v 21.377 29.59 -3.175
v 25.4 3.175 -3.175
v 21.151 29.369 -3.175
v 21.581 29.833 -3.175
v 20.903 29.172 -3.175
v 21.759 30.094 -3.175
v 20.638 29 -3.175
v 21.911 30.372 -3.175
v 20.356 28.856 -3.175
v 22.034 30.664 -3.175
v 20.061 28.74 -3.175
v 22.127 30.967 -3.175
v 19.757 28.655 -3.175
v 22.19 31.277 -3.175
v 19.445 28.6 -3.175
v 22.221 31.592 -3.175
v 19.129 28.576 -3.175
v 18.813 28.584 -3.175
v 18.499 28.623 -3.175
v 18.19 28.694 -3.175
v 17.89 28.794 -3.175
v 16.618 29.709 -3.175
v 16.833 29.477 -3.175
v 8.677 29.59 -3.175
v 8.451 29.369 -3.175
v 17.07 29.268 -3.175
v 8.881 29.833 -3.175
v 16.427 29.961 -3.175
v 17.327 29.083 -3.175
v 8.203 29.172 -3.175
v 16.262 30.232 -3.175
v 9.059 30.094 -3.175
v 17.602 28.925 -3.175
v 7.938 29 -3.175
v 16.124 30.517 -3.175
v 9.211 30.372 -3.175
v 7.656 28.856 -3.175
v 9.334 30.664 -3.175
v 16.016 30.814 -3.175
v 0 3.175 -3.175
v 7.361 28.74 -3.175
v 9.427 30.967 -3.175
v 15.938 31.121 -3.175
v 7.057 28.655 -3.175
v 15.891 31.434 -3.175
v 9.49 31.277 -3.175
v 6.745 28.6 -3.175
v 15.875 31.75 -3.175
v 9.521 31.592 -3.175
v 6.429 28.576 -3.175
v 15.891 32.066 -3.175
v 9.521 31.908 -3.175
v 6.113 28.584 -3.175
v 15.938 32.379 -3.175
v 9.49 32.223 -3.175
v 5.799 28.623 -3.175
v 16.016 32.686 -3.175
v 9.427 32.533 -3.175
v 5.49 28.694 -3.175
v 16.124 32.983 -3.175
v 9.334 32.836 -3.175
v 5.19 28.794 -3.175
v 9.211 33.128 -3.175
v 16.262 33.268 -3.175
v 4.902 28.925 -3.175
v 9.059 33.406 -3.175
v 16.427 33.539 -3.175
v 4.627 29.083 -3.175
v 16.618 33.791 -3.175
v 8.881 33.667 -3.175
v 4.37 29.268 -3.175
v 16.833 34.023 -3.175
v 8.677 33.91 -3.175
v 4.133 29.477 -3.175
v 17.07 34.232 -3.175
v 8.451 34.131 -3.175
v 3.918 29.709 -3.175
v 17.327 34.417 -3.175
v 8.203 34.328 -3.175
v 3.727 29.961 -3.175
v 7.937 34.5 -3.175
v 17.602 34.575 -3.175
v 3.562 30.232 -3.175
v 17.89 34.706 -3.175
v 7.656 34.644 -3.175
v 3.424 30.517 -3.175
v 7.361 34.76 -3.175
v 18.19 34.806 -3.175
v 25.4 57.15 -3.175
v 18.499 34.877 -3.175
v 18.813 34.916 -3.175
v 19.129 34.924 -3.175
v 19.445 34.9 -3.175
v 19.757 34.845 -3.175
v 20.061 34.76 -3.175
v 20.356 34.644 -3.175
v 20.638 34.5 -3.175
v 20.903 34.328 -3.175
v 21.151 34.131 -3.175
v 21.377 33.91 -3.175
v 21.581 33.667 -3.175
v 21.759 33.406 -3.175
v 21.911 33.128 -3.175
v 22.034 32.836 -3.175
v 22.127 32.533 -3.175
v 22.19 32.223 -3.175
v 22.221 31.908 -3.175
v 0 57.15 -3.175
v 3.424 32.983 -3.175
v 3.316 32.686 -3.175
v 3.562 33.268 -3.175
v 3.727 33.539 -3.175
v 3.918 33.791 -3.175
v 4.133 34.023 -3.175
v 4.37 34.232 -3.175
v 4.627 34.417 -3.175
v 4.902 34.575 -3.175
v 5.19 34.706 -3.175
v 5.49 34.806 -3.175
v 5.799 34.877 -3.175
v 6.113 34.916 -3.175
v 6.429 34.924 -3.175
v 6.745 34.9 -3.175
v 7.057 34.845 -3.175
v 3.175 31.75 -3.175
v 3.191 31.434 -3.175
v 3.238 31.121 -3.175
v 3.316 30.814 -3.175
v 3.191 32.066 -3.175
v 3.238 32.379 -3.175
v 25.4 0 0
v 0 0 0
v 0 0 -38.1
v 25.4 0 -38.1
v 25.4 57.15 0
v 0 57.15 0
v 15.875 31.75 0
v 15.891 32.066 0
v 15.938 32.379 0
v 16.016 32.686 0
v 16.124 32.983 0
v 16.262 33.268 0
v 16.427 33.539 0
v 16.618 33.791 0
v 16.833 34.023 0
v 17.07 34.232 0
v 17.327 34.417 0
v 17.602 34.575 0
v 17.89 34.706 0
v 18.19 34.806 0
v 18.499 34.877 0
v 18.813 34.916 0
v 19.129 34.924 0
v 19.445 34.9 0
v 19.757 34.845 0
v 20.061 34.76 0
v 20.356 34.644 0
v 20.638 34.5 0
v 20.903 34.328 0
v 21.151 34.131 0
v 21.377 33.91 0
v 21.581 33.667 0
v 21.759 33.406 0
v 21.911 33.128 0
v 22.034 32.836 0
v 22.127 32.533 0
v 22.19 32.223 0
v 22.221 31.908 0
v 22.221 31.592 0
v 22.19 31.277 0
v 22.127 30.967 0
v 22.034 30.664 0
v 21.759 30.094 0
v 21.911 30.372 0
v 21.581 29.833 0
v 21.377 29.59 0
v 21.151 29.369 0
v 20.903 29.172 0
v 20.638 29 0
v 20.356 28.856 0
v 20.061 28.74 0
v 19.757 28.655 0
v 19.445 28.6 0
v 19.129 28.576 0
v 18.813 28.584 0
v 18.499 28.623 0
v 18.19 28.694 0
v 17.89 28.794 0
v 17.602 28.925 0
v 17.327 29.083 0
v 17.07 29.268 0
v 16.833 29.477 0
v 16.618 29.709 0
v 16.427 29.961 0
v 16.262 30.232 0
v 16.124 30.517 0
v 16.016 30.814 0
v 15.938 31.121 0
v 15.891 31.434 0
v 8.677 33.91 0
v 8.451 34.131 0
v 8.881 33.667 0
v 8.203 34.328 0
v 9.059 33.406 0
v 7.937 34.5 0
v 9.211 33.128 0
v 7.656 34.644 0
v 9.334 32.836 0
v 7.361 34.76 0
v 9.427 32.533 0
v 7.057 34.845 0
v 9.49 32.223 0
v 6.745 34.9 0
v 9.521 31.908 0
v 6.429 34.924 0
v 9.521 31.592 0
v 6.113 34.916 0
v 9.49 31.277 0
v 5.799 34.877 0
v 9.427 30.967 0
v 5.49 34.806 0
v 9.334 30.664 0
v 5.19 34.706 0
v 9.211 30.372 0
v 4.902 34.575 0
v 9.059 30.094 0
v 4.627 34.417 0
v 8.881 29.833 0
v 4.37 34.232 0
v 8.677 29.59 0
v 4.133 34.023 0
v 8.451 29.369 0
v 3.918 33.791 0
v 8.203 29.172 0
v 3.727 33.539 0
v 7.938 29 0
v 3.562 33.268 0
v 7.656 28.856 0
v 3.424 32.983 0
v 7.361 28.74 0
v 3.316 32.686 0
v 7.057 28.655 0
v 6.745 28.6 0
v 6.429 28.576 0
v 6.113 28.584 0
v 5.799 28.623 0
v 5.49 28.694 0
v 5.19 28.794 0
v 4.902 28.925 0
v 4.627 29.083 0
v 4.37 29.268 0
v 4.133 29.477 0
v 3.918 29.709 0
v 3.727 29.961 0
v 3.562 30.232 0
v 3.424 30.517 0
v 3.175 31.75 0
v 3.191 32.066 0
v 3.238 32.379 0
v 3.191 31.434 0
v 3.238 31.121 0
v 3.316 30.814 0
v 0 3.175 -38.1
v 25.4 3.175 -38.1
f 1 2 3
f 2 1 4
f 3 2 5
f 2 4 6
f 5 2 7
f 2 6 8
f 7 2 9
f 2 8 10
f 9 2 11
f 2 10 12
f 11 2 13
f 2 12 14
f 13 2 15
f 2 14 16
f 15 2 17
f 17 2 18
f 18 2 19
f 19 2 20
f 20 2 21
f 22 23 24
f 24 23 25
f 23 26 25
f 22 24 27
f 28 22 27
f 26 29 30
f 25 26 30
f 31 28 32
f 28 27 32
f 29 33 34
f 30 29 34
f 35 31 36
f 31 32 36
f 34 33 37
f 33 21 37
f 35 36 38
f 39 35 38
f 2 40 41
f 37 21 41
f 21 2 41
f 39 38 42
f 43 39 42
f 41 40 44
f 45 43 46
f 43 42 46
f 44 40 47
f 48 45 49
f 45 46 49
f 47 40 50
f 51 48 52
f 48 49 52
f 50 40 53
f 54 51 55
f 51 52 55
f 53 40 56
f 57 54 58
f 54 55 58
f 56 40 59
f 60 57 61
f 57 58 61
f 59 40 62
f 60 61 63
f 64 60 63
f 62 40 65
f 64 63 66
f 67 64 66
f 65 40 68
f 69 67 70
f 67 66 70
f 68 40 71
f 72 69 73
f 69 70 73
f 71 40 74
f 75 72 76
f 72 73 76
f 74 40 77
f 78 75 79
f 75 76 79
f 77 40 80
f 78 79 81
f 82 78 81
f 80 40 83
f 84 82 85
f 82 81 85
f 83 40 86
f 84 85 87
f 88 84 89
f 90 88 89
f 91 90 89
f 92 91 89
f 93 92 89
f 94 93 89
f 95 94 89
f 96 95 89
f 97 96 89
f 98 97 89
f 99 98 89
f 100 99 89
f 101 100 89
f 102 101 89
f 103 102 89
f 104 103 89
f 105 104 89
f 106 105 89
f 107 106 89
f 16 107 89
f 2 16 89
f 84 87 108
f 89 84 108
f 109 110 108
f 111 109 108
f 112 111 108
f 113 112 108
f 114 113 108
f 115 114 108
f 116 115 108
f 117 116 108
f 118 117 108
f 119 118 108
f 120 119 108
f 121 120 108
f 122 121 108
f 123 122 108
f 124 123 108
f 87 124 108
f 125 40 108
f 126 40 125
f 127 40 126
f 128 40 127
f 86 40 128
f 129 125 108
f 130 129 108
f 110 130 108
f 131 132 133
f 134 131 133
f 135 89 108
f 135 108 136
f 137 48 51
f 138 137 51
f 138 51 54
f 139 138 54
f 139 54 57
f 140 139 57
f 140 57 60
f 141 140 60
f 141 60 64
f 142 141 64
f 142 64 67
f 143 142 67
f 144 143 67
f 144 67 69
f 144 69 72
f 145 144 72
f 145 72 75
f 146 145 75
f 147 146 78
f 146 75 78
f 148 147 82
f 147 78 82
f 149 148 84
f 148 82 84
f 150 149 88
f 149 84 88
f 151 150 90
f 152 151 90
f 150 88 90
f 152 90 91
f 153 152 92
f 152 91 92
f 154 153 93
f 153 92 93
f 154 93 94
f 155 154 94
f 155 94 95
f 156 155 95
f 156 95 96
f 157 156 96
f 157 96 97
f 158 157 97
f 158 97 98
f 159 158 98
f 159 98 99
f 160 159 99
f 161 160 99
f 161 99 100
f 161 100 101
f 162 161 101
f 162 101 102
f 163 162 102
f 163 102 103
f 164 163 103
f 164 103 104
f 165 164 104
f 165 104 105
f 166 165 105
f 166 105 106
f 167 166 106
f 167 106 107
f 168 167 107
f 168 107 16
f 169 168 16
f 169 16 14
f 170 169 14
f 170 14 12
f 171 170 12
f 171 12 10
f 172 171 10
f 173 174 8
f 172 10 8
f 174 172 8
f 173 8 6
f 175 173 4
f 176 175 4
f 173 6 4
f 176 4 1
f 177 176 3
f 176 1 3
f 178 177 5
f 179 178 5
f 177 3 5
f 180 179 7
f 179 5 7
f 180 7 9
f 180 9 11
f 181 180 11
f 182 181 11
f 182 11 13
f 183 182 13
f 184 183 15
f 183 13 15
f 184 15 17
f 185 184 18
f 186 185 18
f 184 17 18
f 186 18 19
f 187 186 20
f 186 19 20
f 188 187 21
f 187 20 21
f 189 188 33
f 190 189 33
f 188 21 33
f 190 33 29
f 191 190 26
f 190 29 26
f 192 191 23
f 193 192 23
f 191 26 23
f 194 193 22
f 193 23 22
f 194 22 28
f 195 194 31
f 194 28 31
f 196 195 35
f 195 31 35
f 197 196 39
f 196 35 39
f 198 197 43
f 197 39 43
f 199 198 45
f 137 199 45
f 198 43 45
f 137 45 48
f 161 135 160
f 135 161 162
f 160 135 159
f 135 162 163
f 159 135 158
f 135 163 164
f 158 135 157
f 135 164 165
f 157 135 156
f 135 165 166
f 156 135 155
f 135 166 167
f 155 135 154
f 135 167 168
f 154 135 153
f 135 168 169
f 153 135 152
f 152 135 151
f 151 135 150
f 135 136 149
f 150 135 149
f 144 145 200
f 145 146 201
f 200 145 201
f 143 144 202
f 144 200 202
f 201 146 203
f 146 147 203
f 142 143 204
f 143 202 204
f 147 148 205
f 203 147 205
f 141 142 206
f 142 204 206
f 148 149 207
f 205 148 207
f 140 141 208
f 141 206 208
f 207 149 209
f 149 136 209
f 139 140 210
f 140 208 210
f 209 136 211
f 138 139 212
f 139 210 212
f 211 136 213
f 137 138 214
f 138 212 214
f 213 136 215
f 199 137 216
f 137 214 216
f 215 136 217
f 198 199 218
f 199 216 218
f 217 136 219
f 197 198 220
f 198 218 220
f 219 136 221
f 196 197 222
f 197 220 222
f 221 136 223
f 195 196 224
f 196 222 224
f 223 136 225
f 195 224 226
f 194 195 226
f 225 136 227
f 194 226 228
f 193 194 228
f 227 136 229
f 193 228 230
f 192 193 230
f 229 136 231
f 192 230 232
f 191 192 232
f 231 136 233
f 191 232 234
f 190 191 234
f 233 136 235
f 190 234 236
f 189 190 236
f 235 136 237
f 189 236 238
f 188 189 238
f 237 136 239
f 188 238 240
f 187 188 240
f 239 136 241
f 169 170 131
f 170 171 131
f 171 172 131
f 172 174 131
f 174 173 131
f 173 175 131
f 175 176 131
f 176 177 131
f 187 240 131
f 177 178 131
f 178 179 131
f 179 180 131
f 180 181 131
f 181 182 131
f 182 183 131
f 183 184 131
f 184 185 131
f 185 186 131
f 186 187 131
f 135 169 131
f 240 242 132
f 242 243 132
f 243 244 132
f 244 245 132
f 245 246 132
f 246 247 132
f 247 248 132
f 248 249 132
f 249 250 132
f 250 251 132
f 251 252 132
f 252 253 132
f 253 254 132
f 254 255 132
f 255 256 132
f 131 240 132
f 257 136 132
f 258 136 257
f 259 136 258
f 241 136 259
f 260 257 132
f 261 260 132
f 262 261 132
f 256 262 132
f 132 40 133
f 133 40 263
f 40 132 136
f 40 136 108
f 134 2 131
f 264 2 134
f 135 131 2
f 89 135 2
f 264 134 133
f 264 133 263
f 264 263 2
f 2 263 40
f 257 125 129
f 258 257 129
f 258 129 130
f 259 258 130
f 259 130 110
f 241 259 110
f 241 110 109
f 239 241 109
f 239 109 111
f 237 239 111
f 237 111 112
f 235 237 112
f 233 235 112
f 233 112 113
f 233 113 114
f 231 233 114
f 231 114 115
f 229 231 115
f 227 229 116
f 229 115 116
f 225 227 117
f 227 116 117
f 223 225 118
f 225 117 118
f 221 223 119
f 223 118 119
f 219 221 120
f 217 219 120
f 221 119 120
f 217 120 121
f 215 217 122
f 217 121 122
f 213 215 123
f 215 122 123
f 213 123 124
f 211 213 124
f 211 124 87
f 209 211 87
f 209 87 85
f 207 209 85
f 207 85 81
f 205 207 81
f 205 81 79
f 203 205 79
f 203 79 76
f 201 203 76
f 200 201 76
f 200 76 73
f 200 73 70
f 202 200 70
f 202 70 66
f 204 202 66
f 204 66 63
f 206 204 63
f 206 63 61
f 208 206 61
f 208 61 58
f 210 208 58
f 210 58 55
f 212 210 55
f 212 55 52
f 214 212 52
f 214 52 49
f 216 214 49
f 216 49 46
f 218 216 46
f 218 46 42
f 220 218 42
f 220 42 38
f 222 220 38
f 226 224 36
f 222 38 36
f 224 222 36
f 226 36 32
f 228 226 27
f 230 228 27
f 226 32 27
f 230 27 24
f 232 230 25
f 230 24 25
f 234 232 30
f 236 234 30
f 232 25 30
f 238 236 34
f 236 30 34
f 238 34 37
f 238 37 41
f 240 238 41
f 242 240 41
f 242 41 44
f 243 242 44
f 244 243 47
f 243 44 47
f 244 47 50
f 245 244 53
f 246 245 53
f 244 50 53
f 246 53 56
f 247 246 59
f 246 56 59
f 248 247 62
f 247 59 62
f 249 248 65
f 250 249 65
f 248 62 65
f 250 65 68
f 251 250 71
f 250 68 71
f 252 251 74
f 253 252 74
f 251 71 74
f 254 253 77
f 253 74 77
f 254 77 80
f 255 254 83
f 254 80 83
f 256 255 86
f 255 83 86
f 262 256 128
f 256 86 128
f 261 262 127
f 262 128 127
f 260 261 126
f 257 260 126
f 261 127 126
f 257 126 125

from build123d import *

# Parameters (mm, degrees)
BOSS_EXTRUDE1_DEPTH = 25.4
SKETCH2_R           = 3.175
CUT_EXTRUDE1_DEPTH  = 72.631264997


with BuildPart() as part:
    # Sketch1 → Boss-Extrude1 (new body)
    with BuildSketch(Plane(origin=(0, 0, 0), x_dir=(0, 0, -1), z_dir=(1, 0, 0))):
        Polygon((38.1, 0), (38.1, 3.175), (3.175, 3.175), (3.175, 57.15), (0, 57.15), (0, 0), align=None)
    extrude(amount=BOSS_EXTRUDE1_DEPTH)

    # Sketch2 → Cut-Extrude1 (cut, through all)
    with BuildSketch(Plane(origin=(0, 0, -3.175), x_dir=(-1, 0, 0), z_dir=(0, 0, -1))):
        with Locations((-19.05, 31.75)):
            Circle(SKETCH2_R)
        with Locations((-6.35, 31.75)):
            Circle(SKETCH2_R)
    extrude(amount=-CUT_EXTRUDE1_DEPTH, mode=Mode.SUBTRACT)


solid = part.part
